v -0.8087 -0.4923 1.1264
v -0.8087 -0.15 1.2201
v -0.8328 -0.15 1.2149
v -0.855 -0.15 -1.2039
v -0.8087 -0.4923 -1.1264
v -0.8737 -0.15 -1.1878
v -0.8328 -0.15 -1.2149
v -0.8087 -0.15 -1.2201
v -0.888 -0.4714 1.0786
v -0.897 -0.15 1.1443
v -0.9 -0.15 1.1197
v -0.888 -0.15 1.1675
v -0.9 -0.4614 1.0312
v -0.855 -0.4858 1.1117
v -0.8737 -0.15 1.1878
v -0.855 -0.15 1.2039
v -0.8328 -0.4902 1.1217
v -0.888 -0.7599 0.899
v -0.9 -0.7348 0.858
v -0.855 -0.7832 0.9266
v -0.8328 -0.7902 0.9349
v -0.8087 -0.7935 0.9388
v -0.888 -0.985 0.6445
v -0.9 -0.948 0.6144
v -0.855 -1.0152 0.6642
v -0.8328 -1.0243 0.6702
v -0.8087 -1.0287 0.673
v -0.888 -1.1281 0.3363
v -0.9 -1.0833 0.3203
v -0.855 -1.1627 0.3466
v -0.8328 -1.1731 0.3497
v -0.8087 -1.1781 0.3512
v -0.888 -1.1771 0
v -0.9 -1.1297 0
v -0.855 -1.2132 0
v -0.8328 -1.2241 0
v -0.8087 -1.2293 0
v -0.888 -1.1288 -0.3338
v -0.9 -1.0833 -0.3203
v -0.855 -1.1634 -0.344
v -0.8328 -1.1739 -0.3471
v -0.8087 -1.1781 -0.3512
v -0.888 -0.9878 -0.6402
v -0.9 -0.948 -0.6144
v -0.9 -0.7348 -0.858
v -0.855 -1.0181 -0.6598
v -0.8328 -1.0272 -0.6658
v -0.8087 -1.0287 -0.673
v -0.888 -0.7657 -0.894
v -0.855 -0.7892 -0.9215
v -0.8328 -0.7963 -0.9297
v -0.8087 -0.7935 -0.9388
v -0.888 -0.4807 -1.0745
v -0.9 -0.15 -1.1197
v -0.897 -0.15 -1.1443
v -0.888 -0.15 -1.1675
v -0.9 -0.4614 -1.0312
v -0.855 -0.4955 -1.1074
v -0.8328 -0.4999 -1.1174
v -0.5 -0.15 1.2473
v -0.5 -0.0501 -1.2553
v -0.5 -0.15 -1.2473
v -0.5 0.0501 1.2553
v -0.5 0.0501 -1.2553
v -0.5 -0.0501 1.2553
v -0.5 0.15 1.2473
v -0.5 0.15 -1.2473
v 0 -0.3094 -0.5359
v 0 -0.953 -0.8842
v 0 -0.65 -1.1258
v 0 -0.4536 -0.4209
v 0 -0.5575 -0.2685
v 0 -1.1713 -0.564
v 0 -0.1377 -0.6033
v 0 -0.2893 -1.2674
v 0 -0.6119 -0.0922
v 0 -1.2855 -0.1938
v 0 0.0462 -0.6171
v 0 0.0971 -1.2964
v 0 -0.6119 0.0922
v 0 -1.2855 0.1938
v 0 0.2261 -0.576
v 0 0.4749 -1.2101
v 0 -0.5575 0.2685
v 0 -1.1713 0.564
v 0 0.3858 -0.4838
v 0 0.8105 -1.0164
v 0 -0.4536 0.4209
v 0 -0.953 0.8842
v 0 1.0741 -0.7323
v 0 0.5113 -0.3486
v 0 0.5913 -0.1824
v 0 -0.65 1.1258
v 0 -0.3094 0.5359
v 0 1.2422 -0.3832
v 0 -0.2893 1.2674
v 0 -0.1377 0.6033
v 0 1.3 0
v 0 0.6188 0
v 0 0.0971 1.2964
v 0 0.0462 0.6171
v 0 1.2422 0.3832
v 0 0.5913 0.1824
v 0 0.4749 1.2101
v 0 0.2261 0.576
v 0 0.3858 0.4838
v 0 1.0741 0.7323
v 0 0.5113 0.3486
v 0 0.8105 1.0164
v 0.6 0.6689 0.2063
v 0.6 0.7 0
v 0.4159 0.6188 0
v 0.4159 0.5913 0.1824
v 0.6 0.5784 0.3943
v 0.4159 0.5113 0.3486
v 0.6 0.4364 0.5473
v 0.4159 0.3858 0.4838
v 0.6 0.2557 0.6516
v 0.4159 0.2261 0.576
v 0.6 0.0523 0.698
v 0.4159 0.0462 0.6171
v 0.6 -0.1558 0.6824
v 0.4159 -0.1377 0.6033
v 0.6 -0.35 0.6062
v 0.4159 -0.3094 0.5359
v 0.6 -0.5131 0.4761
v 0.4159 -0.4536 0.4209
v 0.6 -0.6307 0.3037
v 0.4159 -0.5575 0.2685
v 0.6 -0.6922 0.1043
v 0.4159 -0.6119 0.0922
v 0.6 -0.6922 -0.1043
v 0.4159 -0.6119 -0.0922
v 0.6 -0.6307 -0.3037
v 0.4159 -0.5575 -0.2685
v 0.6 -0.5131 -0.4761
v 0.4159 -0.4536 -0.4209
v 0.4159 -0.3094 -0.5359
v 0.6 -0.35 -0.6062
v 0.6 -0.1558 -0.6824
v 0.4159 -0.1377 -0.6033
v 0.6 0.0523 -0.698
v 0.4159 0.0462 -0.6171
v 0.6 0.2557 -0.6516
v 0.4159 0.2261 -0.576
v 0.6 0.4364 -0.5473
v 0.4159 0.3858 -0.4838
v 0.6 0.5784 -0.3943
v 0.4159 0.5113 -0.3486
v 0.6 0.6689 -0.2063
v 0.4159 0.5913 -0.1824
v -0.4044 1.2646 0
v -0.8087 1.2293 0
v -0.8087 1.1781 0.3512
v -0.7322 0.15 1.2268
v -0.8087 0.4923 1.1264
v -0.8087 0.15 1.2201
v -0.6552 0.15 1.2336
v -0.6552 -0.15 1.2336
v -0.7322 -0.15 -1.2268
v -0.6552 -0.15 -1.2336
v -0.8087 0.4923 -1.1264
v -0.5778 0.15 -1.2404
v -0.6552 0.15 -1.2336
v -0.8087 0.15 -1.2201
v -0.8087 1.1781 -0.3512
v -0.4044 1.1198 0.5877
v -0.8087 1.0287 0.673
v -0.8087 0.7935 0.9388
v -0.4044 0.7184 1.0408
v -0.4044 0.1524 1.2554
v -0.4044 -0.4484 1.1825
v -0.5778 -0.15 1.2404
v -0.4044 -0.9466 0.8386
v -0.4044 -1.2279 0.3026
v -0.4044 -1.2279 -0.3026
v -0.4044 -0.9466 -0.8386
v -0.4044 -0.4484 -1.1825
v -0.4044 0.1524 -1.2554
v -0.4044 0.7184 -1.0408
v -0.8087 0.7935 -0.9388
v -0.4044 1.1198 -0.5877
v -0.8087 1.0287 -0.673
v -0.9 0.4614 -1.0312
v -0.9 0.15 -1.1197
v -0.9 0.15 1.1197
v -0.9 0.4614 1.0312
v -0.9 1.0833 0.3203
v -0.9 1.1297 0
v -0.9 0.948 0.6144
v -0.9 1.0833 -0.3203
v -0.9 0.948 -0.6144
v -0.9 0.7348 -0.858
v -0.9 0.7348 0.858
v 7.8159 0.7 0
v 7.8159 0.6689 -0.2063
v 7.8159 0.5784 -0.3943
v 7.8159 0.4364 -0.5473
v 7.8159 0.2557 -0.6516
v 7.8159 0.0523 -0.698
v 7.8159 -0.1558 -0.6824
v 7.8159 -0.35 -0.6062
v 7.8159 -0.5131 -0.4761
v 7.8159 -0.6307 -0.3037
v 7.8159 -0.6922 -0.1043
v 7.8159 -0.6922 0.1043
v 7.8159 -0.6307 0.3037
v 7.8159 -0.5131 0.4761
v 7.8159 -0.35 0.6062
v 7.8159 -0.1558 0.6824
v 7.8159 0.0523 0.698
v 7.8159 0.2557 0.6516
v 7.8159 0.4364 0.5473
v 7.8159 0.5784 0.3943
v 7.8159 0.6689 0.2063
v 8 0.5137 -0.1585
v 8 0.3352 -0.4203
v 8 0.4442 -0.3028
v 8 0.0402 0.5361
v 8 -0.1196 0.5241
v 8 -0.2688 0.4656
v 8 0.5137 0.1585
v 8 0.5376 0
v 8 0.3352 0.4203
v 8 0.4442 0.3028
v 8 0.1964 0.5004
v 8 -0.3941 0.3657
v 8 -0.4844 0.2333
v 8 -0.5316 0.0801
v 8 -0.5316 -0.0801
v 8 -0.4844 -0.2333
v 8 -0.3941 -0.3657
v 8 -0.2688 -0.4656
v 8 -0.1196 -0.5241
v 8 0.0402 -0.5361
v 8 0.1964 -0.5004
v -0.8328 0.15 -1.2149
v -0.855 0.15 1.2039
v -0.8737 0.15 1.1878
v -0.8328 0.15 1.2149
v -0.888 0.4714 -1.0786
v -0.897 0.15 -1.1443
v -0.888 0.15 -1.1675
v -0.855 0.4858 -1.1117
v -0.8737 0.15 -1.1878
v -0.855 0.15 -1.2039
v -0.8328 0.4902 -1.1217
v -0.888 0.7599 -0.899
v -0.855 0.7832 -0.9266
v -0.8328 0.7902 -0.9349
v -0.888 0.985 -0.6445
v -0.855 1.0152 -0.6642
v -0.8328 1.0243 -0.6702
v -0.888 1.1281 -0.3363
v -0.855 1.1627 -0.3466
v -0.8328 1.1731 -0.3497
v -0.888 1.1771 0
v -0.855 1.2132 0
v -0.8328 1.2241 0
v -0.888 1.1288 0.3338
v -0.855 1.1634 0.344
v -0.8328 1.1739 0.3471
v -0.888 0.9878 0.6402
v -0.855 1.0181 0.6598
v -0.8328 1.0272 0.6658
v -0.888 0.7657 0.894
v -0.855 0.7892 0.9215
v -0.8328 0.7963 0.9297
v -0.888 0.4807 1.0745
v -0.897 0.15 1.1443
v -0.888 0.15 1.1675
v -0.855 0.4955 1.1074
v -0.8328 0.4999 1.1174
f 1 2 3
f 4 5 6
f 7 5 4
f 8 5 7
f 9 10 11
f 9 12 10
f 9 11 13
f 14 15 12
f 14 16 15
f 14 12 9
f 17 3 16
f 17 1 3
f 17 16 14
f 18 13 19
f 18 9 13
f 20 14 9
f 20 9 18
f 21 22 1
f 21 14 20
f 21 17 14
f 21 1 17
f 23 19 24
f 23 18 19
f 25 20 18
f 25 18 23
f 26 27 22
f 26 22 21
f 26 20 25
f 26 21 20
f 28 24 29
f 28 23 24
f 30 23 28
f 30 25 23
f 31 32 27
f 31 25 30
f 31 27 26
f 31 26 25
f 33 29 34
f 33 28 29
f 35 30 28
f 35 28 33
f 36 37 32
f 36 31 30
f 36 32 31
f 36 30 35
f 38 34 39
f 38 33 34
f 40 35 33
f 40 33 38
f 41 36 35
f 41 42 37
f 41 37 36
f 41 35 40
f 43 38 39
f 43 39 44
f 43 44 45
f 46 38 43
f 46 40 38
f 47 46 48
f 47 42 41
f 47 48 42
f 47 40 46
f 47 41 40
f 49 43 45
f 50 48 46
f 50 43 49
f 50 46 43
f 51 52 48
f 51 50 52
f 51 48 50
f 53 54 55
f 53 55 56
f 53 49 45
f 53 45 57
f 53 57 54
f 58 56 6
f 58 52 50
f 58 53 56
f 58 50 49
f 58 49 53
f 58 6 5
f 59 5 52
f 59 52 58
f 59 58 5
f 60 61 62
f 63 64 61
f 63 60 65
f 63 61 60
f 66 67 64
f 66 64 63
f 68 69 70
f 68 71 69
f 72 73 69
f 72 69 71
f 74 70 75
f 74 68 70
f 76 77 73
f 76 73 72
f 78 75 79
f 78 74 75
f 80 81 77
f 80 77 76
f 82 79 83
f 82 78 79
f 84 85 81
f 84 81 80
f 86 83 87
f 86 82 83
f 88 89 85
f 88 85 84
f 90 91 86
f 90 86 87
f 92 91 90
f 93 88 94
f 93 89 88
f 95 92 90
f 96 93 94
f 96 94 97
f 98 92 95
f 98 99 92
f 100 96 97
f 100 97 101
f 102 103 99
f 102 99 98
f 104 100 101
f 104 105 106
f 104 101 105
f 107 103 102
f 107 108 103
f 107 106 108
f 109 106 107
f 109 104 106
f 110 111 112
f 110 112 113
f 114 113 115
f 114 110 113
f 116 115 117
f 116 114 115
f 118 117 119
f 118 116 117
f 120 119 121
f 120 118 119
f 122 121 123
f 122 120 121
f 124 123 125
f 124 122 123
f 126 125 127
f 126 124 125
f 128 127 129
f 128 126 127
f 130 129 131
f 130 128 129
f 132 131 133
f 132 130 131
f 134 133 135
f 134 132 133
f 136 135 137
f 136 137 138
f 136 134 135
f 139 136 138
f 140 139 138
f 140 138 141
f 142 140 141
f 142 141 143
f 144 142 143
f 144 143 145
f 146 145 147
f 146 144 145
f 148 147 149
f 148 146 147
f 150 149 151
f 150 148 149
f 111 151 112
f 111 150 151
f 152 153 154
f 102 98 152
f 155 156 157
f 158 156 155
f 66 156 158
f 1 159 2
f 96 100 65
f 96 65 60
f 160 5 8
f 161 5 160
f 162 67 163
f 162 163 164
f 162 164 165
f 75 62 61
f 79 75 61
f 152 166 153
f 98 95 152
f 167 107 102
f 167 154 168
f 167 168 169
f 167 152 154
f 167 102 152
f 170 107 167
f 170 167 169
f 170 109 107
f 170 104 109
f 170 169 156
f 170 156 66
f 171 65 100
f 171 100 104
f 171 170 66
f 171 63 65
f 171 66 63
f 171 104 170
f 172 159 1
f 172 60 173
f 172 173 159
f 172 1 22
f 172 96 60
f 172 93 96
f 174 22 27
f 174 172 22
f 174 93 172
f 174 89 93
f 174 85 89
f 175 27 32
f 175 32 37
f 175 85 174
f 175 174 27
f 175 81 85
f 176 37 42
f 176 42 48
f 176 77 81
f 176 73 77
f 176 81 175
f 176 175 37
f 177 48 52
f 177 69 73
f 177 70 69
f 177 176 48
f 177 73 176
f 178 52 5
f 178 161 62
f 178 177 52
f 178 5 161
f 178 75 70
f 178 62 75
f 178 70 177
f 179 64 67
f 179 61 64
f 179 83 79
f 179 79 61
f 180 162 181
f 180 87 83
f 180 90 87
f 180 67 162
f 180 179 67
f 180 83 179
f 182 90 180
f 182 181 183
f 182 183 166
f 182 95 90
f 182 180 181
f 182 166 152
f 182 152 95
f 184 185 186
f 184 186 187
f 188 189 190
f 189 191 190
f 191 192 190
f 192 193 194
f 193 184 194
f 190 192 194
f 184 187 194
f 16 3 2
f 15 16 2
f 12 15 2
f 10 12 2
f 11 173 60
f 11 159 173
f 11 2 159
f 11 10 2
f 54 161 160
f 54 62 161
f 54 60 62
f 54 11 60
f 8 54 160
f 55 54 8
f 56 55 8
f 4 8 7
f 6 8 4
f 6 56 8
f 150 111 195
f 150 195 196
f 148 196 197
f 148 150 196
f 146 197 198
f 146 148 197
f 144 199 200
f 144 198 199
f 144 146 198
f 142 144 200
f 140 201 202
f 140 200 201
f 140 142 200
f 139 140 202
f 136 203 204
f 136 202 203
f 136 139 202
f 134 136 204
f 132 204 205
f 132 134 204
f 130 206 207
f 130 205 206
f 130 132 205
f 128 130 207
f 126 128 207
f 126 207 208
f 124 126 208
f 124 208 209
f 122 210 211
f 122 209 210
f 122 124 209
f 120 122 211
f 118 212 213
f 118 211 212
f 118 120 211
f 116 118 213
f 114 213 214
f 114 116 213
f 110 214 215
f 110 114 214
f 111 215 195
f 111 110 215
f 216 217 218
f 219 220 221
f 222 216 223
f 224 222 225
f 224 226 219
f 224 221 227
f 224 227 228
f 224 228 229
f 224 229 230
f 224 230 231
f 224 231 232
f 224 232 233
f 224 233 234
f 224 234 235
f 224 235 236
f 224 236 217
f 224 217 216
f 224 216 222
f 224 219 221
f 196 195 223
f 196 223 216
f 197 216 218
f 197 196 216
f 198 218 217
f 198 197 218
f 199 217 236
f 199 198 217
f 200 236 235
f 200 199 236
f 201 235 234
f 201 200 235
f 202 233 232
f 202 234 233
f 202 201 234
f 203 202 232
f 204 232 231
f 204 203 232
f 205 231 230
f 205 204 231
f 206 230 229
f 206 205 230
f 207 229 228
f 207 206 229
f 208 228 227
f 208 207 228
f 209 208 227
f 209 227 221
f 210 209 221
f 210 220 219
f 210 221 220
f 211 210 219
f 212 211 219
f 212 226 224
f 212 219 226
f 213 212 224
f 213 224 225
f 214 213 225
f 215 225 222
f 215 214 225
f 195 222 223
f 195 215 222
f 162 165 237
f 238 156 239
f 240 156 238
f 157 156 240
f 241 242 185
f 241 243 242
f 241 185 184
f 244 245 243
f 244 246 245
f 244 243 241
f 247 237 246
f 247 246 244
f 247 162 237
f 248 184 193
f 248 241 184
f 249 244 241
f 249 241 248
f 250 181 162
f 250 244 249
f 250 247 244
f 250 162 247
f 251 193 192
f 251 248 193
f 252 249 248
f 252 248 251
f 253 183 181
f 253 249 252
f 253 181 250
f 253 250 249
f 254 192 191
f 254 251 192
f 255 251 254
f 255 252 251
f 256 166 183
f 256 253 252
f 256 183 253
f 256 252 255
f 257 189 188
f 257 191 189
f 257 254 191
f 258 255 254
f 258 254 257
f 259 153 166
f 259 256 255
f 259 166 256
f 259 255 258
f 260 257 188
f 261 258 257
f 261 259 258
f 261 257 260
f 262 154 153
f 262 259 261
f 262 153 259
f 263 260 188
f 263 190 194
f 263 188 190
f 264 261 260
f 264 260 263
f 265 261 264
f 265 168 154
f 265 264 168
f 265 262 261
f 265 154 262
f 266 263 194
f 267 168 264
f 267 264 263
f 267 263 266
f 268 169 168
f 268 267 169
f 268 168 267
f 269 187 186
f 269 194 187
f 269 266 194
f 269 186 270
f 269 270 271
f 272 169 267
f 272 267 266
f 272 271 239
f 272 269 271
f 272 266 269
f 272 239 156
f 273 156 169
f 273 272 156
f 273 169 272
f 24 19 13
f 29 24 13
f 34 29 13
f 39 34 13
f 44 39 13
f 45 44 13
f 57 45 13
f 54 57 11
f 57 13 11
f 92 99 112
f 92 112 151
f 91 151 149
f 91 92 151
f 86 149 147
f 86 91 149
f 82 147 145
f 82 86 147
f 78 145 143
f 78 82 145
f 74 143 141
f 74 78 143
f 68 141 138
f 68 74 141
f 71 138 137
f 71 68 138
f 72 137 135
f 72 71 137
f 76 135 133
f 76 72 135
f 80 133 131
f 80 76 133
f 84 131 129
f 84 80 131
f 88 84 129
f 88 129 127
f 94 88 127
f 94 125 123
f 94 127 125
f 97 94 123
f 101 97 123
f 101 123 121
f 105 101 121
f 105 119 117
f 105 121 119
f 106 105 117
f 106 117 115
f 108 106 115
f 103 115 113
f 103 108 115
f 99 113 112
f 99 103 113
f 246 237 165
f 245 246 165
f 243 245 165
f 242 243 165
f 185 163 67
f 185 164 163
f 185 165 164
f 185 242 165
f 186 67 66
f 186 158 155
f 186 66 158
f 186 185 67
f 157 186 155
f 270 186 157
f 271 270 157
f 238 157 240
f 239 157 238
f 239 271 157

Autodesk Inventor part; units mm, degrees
ref_plane "YZ Plane" through (0, 0, 0) normal (1, 0, 0) x (0, 1, 0)
ref_plane "XZ Plane" through (0, 0, 0) normal (0, 1, 0) x (-1, 0, 0)
sketch "Skizze1" plane through (0, 0, 0) normal (0, 0, 1) x (1, 0, 0)
  line L0 (-0.9, 0) -> (8, 0)
  line L1 (8, 0) -> (8, 0.7)
  line L2 (8, 0.7) -> (0.6, 0.7)
  line L3 (0.6, 0.7) -> (0.4159, 0.6188)
  line L4 (0.4159, 0.6188) -> (0, 0.6188)
  line L5 (0, 0.6188) -> (0, 1.3)
  line L6 (-2.68, 0) -> (9.78, 0) projected
  line L7 (0, -0.26) -> (0, 1.56) projected
  line L8 (-0.9, 0) -> (-0.9, 1.2213)
  line L9 (0, 1.3) -> (-0.9, 1.2213)
  line L10 (0.6, 0.7) -> (0, 0.7) construction
  dimension "d0" = 8
  dimension "d1" = 7.4
  dimension "d2" = 0.1841
  dimension "d3" = 0.9
  dimension "d4" = 1.4
  dimension "d5" = 1.2376
  dimension "d9" = 2.6
  dimension "d10" = 5
revolve "Körper" add sketch "Skizze1" angle 360 about axis through (-0.9, 0, 0) along (1, 0, 0)
sketch "Skizze2" plane through (-0.9, 0, 0) normal (-1, 0, 0) x (0, 0, 1)
  circle A0 centre (0, 0) radius 1.3 projected
  line L0 (0, 0) -> (0, 1.2213) projected
  line L1 (-1.3, 0.15) -> (1.3, 0.15)
  line L2 (1.3, 0.15) -> (1.3, -0.15)
  line L3 (1.3, -0.15) -> (-1.3, -0.15)
  line L4 (-1.3, -0.15) -> (-1.3, 0.15)
  line L5 (-1.3, 0) -> (1.3, 0) construction
  line L6 (0, 0.15) -> (0, -0.15) construction
  dimension "d11" = 0.3
  dimension "d12" = 2.6
fillet "Rundung1" radius 0.1 1 edges at (-0.9, -1.2213, 0)
extrude "Loch" cut sketch "Skizze2" against normal blind 0.4 contours A0 L3 L1 | L2 L3 A0 | A0 L1 L2 | A0 L4 L1 | L3 L4 A0
thread "Gewinde" size "M1.4x0.3" class "6g" standard "ISO Metric profile" length 7.4
chamfer "Fase1" distance 0.1624 distance2 0.1841 1 edges at (8, -0.7, 0) measured on face at (8, 0.4293, -0.1327)
ref_plane "Work Plane1" through (30.1625, 0, 0) normal (0, 0, -1) x (1, 0, 0)
equation "\"d11\" = SBR"
equation "\"d12\" = KOD"
equation "\"d14\" = RR"
equation "\"d19\" = STI"
equation "\"d15\" = GEL"
equation "\"d17\" = -0.5 * SPD + 0.5 * GD"
equation "\"d0\" = NLG"
equation "\"d1\" = GEL"
equation "\"d3\" = KOH"
equation "\"d4\" = GD"
equation "\"d5\" = BDM"
equation "\"d9\" = KOD"
equation "\"d10\" = KEWI"
equation "\"GD\" = 1.4"
equation "\"NLG\" = 8"
equation "\"GEL\" = 7.4"
equation "\"KOD\" = 2.6"
equation "\"KOH\" = 0.9"
equation "\"GAL\" = 0.61345 * PTC"
equation "\"SPD\" = 1.07524"
equation "\"BDM\" = 1.23762"
equation "\"GUL\" = 0.61345 * PTC"
equation "\"RR\" = 0.1"
equation "\"SBR\" = 0.3"
equation "\"STI\" = 0.4"
equation "\"KEWI\" = 5deg"
equation "\"PTC\" = 0.3"
equation "\"THREADDIA\" = 1.4"
equation "\"TOA\" = 30deg"
equation "\"NND\" = 1.4"
equation "\"GD1\" = THREADDIA - 1.2269 * PTC"
properties part number "DIN 84 - M1,4 x 8" material "Stahl, weich"
